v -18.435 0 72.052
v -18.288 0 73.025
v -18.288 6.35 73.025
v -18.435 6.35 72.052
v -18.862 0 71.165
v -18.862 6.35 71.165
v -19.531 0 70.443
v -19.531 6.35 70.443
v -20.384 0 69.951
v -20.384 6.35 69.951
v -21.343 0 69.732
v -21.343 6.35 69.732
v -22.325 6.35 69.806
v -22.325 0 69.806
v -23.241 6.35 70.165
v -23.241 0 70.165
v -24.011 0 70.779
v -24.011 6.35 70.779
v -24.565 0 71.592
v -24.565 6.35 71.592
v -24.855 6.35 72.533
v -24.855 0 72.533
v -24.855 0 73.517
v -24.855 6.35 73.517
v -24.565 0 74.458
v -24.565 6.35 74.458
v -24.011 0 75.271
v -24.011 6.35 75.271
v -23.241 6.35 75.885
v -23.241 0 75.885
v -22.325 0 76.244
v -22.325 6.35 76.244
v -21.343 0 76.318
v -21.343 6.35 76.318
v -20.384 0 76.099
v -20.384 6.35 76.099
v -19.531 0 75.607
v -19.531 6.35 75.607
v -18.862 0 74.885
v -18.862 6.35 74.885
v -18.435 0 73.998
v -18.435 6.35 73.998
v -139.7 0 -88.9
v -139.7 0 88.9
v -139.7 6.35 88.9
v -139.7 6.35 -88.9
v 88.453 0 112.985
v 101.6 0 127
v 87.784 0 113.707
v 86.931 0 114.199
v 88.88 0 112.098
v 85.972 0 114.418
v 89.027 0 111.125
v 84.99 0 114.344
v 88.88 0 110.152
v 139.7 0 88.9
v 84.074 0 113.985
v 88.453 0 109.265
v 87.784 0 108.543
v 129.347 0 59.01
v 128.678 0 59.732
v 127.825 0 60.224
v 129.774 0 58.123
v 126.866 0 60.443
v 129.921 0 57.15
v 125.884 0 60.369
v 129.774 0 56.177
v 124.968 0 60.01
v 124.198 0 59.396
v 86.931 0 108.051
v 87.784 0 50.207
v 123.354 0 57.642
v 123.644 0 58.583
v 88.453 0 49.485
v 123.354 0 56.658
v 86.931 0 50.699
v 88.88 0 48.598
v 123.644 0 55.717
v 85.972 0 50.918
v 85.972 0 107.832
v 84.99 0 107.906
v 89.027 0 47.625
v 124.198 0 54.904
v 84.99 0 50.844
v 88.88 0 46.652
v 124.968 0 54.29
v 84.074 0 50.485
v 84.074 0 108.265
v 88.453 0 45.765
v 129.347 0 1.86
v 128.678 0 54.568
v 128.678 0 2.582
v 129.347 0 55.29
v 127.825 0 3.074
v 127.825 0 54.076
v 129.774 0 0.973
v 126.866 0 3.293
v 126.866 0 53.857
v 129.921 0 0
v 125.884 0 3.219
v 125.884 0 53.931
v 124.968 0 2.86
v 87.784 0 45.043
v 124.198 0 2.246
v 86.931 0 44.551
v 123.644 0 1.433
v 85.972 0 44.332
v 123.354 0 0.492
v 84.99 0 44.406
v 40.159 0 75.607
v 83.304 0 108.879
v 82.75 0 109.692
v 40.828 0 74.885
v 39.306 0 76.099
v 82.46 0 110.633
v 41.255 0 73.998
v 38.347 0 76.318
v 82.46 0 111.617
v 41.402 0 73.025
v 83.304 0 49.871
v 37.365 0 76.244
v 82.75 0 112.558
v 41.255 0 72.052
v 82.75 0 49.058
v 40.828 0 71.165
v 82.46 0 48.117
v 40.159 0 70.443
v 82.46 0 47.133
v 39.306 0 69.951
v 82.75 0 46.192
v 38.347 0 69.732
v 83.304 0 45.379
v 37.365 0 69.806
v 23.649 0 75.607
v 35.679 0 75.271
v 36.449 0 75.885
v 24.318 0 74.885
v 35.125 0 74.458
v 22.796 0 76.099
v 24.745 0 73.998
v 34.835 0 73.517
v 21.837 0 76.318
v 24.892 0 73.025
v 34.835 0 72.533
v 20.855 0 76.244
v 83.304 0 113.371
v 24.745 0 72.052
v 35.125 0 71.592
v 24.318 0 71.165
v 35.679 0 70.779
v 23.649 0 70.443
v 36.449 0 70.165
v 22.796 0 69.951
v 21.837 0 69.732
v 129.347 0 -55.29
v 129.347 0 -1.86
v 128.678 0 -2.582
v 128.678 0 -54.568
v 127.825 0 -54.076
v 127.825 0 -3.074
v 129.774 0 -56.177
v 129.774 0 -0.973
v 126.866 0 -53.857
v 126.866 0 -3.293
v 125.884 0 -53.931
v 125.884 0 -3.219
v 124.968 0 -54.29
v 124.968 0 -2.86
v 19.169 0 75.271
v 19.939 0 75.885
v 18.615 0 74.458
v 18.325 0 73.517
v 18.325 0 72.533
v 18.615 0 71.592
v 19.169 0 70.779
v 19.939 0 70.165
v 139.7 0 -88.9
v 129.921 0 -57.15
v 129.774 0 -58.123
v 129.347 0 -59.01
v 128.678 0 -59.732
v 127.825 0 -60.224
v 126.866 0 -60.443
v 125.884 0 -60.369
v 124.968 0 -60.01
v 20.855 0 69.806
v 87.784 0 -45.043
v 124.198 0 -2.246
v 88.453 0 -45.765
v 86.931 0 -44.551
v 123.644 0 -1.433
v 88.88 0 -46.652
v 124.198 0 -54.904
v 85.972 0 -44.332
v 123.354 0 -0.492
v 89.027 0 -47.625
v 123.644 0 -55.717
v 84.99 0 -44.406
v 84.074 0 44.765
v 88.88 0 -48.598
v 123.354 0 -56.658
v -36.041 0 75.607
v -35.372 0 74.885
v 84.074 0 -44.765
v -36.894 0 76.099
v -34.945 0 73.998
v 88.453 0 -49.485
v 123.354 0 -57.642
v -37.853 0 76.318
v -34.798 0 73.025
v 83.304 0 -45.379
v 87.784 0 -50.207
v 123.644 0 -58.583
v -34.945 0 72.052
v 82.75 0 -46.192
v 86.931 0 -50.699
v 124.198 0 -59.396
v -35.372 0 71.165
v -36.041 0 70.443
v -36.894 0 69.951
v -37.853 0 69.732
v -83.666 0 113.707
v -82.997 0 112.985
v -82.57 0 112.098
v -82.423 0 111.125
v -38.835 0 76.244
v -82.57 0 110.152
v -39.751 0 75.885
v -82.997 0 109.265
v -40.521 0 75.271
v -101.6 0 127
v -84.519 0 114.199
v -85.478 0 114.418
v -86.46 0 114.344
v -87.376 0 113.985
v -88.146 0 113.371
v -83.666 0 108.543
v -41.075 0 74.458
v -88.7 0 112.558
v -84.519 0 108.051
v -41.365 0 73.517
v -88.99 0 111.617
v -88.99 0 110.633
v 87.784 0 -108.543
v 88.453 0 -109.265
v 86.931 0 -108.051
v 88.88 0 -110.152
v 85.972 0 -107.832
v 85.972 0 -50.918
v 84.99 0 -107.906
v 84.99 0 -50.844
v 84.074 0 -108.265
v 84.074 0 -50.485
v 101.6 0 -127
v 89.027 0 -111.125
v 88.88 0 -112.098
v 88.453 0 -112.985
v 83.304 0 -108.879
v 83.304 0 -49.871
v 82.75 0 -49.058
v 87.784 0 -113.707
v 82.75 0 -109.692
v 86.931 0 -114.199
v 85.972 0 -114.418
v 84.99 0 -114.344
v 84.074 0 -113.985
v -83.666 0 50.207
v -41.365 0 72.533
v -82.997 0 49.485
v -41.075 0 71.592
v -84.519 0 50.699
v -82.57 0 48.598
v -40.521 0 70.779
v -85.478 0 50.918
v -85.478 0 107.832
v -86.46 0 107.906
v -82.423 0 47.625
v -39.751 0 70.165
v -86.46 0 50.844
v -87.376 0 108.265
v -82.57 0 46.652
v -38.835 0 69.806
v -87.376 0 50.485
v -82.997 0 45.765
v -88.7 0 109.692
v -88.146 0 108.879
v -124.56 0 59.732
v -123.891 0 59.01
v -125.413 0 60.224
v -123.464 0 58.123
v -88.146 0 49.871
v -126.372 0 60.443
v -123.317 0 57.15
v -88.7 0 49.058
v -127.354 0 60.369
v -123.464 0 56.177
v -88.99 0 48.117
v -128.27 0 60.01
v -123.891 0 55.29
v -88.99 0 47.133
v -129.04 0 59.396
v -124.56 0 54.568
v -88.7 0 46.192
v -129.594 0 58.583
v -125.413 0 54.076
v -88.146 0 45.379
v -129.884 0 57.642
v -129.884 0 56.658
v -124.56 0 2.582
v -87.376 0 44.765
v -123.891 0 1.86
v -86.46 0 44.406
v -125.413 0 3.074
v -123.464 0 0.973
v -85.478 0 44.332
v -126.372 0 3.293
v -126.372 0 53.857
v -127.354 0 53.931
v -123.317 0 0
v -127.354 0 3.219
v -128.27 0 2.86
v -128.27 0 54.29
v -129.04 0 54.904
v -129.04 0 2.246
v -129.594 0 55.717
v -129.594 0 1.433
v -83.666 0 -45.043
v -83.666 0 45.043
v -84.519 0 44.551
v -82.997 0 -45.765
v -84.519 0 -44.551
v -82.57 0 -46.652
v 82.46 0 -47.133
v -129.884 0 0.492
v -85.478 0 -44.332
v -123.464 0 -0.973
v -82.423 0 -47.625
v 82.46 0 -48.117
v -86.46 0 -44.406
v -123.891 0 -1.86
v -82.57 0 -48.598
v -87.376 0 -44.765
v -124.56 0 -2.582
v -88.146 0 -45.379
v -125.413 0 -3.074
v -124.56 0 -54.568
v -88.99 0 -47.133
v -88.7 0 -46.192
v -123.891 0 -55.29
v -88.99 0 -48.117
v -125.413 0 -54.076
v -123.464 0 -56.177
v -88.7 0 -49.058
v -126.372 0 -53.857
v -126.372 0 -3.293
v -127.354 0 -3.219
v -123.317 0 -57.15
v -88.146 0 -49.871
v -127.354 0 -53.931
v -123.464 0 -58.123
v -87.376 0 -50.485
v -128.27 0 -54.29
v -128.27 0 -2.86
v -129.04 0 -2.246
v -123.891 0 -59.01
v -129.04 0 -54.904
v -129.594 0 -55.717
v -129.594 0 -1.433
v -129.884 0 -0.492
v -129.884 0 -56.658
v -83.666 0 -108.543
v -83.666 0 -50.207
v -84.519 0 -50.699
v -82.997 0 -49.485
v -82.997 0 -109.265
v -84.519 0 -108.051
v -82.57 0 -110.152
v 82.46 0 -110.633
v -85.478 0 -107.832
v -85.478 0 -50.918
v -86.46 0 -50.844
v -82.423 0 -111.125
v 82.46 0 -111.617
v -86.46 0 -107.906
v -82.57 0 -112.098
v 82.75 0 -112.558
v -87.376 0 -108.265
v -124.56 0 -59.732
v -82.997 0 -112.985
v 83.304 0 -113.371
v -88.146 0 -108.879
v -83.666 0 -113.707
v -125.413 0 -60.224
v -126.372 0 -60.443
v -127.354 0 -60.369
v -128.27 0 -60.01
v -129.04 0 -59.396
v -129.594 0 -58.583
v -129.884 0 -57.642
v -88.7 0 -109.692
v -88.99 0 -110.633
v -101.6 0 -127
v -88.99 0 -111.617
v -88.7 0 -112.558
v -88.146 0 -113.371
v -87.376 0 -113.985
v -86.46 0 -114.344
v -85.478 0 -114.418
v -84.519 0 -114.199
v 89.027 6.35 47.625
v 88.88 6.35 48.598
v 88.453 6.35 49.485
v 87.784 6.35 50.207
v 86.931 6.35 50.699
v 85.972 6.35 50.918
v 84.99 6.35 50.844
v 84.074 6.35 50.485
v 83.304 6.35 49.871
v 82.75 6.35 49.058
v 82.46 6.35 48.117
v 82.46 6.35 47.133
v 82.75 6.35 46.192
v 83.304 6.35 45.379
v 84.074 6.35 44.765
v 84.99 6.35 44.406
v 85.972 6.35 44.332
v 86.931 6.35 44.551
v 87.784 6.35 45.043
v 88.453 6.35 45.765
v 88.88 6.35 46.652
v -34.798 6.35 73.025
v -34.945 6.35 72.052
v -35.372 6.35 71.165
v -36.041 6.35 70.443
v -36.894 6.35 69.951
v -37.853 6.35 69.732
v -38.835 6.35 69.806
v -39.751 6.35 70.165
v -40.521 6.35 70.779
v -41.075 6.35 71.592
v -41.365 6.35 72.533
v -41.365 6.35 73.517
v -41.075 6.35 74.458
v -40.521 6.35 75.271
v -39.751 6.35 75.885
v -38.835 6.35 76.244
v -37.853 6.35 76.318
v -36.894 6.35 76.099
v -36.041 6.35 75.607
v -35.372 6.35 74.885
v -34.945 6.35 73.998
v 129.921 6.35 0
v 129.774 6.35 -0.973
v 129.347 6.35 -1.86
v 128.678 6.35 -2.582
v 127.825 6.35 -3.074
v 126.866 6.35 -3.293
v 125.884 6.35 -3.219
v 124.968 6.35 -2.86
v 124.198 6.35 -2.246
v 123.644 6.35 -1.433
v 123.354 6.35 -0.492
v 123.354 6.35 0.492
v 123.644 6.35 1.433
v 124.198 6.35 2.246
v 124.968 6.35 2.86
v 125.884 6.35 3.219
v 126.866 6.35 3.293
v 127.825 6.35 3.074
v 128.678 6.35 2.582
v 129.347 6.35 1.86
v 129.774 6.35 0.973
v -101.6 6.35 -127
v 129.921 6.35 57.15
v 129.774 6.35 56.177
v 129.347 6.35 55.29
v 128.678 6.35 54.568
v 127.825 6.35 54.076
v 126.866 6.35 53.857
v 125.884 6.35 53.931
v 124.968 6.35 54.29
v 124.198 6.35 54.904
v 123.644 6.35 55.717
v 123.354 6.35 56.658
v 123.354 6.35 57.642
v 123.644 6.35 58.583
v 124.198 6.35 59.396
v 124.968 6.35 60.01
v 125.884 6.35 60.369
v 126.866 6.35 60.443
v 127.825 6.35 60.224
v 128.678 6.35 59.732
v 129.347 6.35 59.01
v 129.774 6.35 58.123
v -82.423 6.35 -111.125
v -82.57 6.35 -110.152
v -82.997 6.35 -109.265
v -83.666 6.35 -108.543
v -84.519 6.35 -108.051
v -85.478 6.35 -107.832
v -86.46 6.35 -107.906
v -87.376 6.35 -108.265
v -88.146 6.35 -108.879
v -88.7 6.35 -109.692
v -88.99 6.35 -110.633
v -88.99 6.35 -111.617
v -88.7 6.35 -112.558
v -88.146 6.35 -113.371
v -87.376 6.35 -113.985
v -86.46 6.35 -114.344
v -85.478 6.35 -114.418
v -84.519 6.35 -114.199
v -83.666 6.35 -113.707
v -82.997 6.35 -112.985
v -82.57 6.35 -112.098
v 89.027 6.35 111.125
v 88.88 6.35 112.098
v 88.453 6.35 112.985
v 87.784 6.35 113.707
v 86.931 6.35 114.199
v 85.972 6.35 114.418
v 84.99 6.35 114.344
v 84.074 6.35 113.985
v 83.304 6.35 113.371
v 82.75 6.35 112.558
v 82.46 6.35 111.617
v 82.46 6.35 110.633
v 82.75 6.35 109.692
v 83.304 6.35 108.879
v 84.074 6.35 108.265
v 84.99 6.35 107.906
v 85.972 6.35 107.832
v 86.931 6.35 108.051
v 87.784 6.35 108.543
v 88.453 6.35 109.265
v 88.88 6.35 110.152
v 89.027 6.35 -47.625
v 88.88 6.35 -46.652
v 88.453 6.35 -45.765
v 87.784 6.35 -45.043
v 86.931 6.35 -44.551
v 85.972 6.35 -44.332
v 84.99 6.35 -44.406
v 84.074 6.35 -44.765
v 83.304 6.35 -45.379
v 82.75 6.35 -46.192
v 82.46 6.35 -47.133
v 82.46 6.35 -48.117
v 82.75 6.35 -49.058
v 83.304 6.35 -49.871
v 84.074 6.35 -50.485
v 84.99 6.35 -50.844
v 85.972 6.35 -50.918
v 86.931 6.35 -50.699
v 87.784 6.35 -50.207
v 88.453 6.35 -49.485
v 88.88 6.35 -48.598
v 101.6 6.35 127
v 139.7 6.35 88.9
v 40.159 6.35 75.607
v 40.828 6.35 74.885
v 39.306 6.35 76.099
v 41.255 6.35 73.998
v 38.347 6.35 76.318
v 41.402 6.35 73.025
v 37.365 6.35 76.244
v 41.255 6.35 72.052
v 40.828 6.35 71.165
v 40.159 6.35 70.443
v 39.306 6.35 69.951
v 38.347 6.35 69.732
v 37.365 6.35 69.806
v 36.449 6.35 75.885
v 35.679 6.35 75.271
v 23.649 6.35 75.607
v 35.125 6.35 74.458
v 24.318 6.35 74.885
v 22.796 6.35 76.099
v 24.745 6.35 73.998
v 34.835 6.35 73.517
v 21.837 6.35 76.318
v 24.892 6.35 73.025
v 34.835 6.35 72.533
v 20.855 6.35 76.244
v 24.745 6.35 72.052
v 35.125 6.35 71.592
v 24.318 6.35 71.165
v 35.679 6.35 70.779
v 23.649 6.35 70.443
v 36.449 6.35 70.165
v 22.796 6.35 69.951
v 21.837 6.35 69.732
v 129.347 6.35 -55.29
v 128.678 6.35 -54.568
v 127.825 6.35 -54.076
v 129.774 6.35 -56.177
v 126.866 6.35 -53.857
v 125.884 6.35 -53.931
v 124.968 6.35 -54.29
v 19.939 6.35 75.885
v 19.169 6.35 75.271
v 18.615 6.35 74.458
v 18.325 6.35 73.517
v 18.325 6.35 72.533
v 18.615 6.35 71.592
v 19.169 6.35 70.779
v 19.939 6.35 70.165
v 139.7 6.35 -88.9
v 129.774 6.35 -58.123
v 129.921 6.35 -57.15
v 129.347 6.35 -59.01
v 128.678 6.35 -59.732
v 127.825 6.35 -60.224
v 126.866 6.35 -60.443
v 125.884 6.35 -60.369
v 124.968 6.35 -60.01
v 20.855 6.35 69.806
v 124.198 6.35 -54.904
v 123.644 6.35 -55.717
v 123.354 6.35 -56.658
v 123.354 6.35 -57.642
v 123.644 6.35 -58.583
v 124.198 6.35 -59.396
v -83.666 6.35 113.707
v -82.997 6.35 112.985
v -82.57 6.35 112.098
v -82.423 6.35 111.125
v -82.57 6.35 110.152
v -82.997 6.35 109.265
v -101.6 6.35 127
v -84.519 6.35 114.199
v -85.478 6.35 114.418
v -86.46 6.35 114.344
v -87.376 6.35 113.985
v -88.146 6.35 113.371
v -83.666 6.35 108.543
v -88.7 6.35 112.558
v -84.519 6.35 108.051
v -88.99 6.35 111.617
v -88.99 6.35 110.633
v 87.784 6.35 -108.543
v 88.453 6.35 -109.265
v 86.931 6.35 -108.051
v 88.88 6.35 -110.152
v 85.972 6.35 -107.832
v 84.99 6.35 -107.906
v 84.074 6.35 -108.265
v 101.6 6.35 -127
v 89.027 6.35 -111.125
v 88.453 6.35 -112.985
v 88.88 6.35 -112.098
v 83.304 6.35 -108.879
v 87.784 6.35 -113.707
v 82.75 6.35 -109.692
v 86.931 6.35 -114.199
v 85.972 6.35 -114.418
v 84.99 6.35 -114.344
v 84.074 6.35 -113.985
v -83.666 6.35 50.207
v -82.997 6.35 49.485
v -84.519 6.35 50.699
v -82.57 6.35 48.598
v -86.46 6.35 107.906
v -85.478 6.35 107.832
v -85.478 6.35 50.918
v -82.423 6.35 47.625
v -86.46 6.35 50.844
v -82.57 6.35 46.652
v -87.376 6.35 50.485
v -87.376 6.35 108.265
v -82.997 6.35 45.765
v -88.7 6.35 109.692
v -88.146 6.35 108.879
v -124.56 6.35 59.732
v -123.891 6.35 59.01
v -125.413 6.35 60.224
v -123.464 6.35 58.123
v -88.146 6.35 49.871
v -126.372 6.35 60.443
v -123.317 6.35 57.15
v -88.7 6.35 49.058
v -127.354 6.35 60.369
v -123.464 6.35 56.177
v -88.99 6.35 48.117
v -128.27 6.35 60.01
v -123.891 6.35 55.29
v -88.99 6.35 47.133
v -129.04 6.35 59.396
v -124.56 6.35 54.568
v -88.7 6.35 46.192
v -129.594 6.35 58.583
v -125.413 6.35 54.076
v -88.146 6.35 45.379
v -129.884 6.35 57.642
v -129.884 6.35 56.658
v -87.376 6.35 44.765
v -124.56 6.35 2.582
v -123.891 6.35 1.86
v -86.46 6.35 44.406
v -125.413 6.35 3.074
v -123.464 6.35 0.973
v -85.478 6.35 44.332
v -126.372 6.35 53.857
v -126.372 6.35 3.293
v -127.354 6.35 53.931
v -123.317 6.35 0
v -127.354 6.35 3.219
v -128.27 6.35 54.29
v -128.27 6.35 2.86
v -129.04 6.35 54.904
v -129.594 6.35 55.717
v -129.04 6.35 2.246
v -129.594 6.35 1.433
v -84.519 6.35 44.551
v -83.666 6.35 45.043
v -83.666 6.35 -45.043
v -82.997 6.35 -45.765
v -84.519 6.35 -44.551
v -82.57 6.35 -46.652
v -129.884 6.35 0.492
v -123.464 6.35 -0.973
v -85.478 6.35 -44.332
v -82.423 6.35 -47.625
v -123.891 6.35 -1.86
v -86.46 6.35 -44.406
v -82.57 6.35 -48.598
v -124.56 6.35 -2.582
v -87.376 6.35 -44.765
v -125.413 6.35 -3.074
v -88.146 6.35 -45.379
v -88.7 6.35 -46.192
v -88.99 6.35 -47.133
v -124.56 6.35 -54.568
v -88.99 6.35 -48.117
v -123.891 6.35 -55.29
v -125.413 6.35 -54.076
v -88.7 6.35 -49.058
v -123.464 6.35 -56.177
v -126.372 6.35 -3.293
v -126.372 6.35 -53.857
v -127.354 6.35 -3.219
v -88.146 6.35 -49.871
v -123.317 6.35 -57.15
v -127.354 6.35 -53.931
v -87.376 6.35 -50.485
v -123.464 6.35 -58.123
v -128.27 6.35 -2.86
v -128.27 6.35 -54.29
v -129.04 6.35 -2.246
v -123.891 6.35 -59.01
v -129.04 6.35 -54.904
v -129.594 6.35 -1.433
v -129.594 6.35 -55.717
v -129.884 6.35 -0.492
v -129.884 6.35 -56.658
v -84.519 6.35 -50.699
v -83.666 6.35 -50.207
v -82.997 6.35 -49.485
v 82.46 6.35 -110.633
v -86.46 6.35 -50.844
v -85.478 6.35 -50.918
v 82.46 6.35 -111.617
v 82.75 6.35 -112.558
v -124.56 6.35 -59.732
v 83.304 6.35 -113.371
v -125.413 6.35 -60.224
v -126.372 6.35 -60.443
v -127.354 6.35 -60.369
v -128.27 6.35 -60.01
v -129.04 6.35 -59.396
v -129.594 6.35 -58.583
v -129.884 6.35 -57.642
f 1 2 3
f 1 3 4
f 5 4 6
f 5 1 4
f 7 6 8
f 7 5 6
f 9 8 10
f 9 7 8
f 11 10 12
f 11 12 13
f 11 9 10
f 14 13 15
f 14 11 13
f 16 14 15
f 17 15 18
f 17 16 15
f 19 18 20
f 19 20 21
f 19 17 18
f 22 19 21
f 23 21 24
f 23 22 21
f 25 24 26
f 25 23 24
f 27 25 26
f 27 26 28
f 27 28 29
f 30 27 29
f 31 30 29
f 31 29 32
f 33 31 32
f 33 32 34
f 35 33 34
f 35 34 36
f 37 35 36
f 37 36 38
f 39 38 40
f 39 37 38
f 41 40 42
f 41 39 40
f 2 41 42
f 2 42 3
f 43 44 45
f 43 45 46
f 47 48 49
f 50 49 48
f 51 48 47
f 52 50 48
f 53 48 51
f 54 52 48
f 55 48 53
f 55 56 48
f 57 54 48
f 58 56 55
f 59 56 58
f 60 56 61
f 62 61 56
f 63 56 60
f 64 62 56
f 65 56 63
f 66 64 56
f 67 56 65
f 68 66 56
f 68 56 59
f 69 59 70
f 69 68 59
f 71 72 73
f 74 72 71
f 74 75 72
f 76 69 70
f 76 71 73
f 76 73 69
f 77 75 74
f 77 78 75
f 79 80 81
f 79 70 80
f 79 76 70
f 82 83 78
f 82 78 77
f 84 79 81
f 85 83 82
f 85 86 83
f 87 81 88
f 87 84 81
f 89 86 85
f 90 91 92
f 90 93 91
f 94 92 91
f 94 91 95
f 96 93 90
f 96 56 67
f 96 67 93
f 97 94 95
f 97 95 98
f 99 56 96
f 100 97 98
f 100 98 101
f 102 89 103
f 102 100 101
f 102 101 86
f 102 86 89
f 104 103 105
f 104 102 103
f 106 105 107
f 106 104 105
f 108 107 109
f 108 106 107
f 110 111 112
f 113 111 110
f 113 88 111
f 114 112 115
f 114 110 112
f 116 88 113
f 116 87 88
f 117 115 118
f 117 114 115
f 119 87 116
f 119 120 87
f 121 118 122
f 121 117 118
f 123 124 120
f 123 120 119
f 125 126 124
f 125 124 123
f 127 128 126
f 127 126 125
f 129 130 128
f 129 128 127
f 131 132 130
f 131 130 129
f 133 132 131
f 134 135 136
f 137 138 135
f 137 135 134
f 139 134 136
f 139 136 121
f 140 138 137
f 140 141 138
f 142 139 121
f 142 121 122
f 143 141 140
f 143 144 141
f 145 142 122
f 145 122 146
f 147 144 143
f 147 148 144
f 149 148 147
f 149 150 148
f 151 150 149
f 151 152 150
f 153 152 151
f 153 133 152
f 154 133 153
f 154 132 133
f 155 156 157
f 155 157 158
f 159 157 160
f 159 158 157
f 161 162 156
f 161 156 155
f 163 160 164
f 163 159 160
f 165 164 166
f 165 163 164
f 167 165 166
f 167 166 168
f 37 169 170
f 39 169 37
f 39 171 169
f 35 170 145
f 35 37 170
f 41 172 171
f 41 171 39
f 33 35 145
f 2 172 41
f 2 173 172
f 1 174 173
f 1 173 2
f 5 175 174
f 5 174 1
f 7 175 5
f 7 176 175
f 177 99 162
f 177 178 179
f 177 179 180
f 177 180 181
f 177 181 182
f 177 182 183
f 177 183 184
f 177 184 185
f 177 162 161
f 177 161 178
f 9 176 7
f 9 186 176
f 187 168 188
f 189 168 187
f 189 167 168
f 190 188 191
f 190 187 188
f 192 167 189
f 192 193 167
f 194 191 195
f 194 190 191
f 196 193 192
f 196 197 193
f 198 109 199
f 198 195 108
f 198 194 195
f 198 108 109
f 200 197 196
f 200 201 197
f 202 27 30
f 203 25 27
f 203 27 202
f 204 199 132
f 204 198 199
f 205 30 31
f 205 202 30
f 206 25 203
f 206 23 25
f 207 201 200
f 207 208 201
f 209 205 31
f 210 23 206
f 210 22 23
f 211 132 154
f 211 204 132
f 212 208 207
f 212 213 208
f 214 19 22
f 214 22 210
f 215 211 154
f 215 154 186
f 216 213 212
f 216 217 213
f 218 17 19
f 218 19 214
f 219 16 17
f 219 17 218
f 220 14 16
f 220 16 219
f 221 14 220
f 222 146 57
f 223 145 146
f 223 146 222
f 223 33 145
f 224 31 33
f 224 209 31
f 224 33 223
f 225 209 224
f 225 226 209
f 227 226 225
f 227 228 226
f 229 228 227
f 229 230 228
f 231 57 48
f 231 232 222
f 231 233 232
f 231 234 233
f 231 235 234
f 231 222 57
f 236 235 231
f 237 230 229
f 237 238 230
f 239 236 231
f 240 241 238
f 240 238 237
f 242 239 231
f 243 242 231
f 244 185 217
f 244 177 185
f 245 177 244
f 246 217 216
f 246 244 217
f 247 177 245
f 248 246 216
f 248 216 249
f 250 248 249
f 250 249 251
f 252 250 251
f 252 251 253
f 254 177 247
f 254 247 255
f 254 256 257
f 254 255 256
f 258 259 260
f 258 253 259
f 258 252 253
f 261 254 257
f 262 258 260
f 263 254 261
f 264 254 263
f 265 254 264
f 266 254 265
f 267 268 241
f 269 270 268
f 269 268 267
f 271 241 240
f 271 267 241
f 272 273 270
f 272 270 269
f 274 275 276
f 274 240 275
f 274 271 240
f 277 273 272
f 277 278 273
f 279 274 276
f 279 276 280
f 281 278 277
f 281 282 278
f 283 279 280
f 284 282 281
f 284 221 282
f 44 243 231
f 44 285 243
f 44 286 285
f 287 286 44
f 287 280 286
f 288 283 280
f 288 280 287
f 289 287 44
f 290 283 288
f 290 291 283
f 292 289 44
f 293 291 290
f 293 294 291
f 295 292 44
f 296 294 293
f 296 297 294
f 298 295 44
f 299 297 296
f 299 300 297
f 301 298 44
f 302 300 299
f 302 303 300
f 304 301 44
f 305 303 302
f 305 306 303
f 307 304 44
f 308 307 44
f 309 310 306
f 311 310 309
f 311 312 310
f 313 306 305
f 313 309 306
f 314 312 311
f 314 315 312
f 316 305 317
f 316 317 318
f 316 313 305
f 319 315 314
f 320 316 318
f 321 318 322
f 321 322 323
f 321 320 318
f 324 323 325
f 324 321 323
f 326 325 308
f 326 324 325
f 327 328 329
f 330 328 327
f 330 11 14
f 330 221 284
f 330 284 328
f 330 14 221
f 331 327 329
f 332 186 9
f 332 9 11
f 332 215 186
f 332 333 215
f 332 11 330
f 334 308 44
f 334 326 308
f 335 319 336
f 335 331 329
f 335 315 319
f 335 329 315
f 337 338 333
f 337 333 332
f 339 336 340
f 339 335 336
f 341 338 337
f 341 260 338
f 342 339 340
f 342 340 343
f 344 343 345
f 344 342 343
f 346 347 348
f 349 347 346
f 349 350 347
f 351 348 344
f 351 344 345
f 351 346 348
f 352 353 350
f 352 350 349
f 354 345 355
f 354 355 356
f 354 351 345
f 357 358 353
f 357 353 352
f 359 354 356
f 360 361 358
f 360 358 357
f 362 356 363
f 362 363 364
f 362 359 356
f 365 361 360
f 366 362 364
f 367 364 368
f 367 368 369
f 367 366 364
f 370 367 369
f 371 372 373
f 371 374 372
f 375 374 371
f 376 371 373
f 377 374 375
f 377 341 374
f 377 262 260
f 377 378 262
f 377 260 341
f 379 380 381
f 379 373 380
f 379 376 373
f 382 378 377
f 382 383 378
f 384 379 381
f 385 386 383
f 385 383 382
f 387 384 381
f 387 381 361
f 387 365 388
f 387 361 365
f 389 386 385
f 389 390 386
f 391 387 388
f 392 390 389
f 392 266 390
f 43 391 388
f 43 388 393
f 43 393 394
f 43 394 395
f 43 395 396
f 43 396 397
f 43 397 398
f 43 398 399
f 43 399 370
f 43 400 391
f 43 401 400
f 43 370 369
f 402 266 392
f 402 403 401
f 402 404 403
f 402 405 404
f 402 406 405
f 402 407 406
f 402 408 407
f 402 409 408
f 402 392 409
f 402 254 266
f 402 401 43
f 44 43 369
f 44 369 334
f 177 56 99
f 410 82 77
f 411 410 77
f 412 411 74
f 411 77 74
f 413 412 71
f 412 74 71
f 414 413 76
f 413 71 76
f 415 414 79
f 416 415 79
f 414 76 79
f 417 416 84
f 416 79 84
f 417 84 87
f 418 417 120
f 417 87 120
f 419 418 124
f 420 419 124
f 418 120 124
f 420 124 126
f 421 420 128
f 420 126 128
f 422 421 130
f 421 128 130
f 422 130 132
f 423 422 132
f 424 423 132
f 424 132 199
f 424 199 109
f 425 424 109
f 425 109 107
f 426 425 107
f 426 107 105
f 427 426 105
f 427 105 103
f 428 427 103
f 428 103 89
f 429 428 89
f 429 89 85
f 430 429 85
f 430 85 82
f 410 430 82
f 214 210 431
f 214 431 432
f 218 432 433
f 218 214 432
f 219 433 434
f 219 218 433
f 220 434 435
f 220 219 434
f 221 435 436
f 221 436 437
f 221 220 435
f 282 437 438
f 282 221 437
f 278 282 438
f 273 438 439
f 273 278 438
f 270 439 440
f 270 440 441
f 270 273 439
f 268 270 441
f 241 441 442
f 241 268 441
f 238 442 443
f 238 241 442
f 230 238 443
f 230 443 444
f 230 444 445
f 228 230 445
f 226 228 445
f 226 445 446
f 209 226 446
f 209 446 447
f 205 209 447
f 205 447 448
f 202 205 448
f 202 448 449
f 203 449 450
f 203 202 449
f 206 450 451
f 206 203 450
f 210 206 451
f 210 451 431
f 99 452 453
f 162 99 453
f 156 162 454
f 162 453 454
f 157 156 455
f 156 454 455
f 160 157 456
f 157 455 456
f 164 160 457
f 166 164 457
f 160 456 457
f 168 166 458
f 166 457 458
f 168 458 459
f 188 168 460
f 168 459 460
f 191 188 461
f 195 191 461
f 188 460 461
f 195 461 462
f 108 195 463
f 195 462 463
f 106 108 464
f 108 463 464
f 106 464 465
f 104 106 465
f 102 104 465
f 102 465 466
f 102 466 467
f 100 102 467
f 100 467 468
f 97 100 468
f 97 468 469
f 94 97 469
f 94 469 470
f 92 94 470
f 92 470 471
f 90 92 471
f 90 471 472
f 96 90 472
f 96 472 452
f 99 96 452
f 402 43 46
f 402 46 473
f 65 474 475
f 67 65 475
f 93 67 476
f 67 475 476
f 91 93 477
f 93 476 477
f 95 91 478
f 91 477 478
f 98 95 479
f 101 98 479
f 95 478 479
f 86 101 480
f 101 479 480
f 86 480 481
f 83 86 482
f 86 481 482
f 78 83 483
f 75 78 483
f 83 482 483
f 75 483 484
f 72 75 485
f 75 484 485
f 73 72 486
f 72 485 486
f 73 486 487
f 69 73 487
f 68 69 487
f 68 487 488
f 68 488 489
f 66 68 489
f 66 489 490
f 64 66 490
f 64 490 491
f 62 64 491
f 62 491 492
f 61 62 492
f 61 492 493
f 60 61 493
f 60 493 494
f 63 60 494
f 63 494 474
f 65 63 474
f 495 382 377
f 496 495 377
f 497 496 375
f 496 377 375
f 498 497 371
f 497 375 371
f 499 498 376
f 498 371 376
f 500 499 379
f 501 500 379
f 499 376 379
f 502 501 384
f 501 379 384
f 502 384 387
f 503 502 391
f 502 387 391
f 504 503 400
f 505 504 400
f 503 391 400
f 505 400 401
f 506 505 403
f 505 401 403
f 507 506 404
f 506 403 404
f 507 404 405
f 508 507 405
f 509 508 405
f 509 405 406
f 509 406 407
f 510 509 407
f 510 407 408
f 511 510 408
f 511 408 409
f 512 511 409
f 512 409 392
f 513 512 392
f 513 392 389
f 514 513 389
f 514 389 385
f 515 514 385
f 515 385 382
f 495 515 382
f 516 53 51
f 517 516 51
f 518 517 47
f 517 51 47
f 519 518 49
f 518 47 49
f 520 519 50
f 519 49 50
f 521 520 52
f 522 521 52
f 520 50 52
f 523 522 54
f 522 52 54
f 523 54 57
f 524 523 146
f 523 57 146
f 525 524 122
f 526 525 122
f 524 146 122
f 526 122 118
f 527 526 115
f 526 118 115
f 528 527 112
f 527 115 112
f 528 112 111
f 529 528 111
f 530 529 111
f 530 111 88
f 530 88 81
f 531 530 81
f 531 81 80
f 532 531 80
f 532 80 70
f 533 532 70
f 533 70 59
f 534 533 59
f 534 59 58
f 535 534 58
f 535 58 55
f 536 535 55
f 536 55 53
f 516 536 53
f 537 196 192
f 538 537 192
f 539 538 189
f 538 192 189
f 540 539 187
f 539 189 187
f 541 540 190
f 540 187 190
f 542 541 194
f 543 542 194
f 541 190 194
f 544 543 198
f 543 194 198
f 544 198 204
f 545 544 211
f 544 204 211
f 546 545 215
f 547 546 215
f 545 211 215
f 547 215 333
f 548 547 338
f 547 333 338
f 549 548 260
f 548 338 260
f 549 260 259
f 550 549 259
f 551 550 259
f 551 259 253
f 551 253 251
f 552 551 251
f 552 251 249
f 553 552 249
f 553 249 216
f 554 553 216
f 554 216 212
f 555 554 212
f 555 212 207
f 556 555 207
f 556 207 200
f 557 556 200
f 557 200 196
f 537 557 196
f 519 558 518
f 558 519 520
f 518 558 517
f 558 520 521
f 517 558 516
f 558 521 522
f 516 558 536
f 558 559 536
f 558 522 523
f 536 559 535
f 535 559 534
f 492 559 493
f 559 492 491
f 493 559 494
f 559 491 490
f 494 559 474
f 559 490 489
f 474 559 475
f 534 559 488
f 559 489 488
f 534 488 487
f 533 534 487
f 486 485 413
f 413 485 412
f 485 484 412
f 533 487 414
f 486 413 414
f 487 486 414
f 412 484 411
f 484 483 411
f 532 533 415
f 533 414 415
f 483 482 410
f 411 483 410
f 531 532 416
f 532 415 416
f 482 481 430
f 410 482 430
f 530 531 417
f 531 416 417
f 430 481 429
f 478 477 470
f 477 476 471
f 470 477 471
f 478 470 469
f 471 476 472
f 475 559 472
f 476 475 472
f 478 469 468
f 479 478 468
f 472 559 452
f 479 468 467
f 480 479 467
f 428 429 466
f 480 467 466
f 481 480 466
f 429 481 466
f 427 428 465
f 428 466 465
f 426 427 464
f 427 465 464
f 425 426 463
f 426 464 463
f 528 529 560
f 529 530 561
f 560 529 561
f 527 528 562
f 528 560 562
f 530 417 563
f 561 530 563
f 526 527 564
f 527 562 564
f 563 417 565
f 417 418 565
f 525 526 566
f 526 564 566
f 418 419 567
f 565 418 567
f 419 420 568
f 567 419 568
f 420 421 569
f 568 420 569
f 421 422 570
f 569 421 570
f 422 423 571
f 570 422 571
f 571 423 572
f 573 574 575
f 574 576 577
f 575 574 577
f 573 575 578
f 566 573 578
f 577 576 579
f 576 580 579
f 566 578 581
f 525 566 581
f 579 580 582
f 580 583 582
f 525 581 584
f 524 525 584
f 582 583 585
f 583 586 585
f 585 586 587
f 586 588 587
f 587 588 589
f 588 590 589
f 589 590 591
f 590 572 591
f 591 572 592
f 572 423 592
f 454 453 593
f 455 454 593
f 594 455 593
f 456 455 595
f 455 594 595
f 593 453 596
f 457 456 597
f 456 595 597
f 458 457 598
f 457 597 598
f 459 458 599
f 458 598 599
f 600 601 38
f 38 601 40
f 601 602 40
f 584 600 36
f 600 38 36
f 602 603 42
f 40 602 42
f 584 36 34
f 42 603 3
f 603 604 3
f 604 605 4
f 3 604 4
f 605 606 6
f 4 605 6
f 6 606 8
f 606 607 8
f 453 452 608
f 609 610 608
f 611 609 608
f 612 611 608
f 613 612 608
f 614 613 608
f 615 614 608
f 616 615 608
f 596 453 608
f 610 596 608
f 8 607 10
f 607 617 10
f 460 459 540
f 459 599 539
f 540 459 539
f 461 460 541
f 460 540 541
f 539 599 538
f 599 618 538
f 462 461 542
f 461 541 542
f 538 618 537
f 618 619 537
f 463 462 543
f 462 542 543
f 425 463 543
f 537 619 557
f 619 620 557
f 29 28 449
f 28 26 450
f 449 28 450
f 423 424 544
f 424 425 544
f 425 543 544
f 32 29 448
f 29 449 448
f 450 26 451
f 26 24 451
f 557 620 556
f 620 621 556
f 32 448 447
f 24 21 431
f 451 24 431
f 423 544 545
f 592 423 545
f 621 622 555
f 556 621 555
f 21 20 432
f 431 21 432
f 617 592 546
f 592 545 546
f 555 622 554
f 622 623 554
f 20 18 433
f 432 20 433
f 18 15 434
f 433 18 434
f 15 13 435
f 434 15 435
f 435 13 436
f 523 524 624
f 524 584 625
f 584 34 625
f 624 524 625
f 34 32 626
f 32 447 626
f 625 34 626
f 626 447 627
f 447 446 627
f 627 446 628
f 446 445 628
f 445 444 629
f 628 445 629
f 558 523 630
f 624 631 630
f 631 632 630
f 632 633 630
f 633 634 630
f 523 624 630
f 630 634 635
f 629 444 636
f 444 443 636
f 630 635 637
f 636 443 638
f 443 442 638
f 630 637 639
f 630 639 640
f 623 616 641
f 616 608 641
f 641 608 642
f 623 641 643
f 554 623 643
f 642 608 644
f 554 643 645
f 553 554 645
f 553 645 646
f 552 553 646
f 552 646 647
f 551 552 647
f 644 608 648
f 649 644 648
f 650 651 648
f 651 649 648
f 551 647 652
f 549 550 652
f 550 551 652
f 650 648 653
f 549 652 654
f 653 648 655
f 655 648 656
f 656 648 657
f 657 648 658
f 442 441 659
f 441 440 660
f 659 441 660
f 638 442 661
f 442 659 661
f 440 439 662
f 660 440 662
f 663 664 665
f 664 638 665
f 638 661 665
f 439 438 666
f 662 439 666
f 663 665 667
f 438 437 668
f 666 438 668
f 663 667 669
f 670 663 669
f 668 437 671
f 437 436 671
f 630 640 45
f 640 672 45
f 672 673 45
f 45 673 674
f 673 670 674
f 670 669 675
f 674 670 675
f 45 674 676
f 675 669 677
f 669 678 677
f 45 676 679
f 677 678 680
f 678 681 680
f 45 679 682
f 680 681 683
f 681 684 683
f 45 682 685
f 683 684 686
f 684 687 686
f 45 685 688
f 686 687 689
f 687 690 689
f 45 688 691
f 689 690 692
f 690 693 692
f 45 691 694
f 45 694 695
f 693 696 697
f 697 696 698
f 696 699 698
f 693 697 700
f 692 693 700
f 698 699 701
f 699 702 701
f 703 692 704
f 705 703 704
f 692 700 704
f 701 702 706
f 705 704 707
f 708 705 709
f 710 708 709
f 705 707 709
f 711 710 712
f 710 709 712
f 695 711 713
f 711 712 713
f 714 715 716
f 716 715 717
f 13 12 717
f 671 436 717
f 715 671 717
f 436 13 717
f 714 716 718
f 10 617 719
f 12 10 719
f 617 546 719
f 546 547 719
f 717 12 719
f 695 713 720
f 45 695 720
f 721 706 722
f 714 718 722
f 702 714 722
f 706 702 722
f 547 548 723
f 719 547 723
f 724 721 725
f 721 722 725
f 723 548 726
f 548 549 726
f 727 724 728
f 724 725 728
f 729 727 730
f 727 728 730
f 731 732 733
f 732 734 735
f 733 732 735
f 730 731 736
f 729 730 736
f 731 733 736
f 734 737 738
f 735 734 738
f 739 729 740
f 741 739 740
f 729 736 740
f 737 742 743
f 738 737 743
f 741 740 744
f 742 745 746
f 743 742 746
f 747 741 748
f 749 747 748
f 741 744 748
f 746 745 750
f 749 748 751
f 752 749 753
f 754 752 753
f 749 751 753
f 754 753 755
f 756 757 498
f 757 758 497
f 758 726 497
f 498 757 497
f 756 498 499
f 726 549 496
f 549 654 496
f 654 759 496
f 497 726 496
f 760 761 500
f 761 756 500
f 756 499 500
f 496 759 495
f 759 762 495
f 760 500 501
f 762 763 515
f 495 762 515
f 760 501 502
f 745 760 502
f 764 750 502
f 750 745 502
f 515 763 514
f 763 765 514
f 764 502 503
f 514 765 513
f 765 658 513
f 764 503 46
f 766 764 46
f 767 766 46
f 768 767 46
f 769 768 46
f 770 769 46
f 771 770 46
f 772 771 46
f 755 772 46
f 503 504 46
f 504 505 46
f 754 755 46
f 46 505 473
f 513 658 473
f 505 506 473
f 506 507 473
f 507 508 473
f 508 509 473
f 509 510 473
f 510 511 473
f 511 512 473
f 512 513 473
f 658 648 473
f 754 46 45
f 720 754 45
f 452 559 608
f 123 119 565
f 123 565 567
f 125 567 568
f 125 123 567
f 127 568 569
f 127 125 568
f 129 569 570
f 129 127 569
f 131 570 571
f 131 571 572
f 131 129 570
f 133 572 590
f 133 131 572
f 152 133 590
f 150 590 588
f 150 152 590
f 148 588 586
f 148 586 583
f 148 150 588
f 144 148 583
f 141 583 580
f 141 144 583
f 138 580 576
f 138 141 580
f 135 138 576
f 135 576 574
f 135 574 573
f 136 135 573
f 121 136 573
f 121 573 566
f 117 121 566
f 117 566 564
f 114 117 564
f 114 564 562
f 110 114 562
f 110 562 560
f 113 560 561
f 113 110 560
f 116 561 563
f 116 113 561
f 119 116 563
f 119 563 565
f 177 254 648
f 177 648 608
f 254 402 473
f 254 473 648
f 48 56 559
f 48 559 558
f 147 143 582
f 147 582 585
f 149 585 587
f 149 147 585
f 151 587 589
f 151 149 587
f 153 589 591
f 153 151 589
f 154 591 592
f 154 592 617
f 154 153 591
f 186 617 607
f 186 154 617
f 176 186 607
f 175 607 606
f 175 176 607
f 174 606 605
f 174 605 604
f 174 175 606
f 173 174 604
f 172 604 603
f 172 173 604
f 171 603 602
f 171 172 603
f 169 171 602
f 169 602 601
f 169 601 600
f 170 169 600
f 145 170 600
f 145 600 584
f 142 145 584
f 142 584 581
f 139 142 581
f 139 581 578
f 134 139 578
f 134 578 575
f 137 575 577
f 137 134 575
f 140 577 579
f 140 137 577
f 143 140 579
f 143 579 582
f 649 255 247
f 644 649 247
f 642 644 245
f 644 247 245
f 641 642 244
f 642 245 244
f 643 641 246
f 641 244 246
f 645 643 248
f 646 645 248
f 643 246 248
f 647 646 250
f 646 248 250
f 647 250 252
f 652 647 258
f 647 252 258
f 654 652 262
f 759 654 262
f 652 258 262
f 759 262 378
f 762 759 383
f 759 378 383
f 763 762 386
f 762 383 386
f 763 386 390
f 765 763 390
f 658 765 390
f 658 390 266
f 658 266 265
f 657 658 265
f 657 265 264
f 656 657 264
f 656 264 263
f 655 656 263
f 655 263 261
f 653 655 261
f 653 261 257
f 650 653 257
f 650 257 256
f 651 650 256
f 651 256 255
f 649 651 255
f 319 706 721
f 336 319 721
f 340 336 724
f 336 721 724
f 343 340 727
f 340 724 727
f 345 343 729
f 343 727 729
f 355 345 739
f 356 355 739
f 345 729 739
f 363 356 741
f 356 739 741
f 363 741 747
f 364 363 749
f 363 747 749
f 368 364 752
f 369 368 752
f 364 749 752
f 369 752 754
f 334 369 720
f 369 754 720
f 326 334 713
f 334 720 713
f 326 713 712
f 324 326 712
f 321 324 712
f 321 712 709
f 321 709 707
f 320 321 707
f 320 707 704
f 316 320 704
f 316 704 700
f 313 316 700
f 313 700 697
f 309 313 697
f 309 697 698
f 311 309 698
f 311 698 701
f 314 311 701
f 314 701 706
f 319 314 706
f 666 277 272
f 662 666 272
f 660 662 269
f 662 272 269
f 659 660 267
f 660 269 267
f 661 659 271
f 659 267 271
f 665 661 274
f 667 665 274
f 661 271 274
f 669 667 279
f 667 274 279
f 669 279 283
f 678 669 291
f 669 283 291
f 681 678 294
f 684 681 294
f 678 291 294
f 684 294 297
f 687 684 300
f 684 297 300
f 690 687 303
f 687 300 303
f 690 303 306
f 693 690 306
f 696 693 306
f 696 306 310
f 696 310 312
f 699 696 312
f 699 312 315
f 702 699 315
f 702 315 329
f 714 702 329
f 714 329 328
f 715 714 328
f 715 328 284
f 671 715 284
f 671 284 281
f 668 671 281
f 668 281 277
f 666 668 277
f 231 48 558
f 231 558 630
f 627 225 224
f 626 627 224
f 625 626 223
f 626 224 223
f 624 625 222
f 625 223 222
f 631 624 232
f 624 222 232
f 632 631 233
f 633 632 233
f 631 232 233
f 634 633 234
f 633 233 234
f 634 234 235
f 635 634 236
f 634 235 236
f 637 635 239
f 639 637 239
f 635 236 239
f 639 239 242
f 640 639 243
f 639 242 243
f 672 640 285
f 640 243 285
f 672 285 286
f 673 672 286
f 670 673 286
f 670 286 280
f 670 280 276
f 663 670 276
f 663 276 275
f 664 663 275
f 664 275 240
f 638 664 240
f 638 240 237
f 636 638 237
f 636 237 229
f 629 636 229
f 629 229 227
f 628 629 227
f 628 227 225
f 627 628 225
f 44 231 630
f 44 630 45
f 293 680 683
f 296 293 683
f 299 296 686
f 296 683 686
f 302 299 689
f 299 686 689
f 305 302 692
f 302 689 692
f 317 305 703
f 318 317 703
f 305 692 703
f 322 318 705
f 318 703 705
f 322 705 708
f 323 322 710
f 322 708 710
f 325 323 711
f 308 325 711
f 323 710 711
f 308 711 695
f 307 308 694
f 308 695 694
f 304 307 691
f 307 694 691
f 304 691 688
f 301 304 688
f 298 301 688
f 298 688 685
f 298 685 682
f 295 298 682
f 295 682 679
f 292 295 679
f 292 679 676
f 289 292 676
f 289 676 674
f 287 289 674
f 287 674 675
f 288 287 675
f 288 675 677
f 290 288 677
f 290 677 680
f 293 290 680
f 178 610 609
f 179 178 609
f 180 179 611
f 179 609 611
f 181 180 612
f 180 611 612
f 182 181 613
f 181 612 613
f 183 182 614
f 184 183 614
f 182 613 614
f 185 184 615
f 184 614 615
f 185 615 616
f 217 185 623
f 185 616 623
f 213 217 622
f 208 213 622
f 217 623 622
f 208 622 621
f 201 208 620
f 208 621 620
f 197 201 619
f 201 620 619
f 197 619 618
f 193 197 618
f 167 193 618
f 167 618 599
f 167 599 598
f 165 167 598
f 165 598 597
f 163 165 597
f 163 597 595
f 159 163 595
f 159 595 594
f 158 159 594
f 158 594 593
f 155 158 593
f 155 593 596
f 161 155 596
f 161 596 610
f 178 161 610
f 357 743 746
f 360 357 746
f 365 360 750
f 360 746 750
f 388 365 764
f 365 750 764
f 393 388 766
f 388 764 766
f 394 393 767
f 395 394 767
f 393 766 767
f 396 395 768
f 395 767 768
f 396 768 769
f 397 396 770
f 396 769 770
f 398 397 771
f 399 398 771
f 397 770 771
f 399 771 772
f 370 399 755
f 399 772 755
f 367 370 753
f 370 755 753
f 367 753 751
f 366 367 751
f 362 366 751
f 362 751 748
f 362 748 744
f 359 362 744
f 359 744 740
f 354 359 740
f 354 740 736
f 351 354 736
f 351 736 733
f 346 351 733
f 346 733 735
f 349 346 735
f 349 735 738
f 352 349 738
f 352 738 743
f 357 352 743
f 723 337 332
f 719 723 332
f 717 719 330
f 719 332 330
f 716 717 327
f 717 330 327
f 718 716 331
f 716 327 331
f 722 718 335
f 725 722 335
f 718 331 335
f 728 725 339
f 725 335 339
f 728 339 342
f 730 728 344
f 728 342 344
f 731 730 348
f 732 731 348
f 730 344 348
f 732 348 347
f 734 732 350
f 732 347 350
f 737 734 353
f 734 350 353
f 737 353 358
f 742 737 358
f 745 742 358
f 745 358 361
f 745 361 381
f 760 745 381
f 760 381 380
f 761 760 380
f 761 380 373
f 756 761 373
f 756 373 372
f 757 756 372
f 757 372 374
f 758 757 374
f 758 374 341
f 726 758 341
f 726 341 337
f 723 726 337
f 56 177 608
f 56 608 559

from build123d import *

# Parameters (mm, degrees)
SKETCH2_R           = 3.302
BOSS_EXTRUDE1_DEPTH = 6.35
SKETCH3_R           = 3.302
CUT_EXTRUDE1_DEPTH  = 7.35
SKETCH4_R           = 3.302
CUT_EXTRUDE2_DEPTH  = 7.35


with BuildPart() as part:
    # Sketch2 → Boss-Extrude1 (new body)
    with BuildSketch(Plane(origin=(0, 0, 0), x_dir=(1, 0, 0), z_dir=(0, 1, 0))):
        Polygon((-139.7, -88.9), (-139.7, 88.9), (-101.6, 127), (101.6, 127), (139.7, 88.9), (139.7, -88.9), (101.6, -127), (-101.6, -127), align=None)
        with Locations((-21.59, -73.025)):
            Circle(SKETCH2_R, mode=Mode.SUBTRACT)
        with Locations((-38.1, -73.025)):
            Circle(SKETCH2_R, mode=Mode.SUBTRACT)
        with Locations((38.1, -73.025)):
            Circle(SKETCH2_R, mode=Mode.SUBTRACT)
        with Locations((21.59, -73.025)):
            Circle(SKETCH2_R, mode=Mode.SUBTRACT)
    extrude(amount=BOSS_EXTRUDE1_DEPTH)

    # Sketch3 → Cut-Extrude1 (cut, through all)
    with BuildSketch(Plane(origin=(0, 6.35, 0), x_dir=(1, 0, 0), z_dir=(0, 1, 0))):
        with Locations((-126.619, 57.15)):
            Circle(SKETCH3_R)
        with Locations((-126.619, -57.15)):
            Circle(SKETCH3_R)
        with Locations((126.619, -57.15)):
            Circle(SKETCH3_R)
        with Locations((126.619, 0)):
            Circle(SKETCH3_R)
        with Locations((126.619, 57.15)):
            Circle(SKETCH3_R)
        with Locations((-126.619, 0)):
            Circle(SKETCH3_R)
    extrude(amount=-CUT_EXTRUDE1_DEPTH, mode=Mode.SUBTRACT)

    # Sketch4 → Cut-Extrude2 (cut, through all)
    with BuildSketch(Plane.XZ):
        with Locations((-85.725, 111.125)):
            Circle(SKETCH4_R)
        with Locations((-85.725, -111.125)):
            Circle(SKETCH4_R)
        with Locations((85.725, -111.125)):
            Circle(SKETCH4_R)
        with Locations((85.725, -47.625)):
            Circle(SKETCH4_R)
        with Locations((85.725, 47.625)):
            Circle(SKETCH4_R)
        with Locations((85.725, 111.125)):
            Circle(SKETCH4_R)
        with Locations((-85.725, 47.625)):
            Circle(SKETCH4_R)
        with Locations((-85.725, -47.625)):
            Circle(SKETCH4_R)
    extrude(amount=-CUT_EXTRUDE2_DEPTH, mode=Mode.SUBTRACT)


solid = part.part
